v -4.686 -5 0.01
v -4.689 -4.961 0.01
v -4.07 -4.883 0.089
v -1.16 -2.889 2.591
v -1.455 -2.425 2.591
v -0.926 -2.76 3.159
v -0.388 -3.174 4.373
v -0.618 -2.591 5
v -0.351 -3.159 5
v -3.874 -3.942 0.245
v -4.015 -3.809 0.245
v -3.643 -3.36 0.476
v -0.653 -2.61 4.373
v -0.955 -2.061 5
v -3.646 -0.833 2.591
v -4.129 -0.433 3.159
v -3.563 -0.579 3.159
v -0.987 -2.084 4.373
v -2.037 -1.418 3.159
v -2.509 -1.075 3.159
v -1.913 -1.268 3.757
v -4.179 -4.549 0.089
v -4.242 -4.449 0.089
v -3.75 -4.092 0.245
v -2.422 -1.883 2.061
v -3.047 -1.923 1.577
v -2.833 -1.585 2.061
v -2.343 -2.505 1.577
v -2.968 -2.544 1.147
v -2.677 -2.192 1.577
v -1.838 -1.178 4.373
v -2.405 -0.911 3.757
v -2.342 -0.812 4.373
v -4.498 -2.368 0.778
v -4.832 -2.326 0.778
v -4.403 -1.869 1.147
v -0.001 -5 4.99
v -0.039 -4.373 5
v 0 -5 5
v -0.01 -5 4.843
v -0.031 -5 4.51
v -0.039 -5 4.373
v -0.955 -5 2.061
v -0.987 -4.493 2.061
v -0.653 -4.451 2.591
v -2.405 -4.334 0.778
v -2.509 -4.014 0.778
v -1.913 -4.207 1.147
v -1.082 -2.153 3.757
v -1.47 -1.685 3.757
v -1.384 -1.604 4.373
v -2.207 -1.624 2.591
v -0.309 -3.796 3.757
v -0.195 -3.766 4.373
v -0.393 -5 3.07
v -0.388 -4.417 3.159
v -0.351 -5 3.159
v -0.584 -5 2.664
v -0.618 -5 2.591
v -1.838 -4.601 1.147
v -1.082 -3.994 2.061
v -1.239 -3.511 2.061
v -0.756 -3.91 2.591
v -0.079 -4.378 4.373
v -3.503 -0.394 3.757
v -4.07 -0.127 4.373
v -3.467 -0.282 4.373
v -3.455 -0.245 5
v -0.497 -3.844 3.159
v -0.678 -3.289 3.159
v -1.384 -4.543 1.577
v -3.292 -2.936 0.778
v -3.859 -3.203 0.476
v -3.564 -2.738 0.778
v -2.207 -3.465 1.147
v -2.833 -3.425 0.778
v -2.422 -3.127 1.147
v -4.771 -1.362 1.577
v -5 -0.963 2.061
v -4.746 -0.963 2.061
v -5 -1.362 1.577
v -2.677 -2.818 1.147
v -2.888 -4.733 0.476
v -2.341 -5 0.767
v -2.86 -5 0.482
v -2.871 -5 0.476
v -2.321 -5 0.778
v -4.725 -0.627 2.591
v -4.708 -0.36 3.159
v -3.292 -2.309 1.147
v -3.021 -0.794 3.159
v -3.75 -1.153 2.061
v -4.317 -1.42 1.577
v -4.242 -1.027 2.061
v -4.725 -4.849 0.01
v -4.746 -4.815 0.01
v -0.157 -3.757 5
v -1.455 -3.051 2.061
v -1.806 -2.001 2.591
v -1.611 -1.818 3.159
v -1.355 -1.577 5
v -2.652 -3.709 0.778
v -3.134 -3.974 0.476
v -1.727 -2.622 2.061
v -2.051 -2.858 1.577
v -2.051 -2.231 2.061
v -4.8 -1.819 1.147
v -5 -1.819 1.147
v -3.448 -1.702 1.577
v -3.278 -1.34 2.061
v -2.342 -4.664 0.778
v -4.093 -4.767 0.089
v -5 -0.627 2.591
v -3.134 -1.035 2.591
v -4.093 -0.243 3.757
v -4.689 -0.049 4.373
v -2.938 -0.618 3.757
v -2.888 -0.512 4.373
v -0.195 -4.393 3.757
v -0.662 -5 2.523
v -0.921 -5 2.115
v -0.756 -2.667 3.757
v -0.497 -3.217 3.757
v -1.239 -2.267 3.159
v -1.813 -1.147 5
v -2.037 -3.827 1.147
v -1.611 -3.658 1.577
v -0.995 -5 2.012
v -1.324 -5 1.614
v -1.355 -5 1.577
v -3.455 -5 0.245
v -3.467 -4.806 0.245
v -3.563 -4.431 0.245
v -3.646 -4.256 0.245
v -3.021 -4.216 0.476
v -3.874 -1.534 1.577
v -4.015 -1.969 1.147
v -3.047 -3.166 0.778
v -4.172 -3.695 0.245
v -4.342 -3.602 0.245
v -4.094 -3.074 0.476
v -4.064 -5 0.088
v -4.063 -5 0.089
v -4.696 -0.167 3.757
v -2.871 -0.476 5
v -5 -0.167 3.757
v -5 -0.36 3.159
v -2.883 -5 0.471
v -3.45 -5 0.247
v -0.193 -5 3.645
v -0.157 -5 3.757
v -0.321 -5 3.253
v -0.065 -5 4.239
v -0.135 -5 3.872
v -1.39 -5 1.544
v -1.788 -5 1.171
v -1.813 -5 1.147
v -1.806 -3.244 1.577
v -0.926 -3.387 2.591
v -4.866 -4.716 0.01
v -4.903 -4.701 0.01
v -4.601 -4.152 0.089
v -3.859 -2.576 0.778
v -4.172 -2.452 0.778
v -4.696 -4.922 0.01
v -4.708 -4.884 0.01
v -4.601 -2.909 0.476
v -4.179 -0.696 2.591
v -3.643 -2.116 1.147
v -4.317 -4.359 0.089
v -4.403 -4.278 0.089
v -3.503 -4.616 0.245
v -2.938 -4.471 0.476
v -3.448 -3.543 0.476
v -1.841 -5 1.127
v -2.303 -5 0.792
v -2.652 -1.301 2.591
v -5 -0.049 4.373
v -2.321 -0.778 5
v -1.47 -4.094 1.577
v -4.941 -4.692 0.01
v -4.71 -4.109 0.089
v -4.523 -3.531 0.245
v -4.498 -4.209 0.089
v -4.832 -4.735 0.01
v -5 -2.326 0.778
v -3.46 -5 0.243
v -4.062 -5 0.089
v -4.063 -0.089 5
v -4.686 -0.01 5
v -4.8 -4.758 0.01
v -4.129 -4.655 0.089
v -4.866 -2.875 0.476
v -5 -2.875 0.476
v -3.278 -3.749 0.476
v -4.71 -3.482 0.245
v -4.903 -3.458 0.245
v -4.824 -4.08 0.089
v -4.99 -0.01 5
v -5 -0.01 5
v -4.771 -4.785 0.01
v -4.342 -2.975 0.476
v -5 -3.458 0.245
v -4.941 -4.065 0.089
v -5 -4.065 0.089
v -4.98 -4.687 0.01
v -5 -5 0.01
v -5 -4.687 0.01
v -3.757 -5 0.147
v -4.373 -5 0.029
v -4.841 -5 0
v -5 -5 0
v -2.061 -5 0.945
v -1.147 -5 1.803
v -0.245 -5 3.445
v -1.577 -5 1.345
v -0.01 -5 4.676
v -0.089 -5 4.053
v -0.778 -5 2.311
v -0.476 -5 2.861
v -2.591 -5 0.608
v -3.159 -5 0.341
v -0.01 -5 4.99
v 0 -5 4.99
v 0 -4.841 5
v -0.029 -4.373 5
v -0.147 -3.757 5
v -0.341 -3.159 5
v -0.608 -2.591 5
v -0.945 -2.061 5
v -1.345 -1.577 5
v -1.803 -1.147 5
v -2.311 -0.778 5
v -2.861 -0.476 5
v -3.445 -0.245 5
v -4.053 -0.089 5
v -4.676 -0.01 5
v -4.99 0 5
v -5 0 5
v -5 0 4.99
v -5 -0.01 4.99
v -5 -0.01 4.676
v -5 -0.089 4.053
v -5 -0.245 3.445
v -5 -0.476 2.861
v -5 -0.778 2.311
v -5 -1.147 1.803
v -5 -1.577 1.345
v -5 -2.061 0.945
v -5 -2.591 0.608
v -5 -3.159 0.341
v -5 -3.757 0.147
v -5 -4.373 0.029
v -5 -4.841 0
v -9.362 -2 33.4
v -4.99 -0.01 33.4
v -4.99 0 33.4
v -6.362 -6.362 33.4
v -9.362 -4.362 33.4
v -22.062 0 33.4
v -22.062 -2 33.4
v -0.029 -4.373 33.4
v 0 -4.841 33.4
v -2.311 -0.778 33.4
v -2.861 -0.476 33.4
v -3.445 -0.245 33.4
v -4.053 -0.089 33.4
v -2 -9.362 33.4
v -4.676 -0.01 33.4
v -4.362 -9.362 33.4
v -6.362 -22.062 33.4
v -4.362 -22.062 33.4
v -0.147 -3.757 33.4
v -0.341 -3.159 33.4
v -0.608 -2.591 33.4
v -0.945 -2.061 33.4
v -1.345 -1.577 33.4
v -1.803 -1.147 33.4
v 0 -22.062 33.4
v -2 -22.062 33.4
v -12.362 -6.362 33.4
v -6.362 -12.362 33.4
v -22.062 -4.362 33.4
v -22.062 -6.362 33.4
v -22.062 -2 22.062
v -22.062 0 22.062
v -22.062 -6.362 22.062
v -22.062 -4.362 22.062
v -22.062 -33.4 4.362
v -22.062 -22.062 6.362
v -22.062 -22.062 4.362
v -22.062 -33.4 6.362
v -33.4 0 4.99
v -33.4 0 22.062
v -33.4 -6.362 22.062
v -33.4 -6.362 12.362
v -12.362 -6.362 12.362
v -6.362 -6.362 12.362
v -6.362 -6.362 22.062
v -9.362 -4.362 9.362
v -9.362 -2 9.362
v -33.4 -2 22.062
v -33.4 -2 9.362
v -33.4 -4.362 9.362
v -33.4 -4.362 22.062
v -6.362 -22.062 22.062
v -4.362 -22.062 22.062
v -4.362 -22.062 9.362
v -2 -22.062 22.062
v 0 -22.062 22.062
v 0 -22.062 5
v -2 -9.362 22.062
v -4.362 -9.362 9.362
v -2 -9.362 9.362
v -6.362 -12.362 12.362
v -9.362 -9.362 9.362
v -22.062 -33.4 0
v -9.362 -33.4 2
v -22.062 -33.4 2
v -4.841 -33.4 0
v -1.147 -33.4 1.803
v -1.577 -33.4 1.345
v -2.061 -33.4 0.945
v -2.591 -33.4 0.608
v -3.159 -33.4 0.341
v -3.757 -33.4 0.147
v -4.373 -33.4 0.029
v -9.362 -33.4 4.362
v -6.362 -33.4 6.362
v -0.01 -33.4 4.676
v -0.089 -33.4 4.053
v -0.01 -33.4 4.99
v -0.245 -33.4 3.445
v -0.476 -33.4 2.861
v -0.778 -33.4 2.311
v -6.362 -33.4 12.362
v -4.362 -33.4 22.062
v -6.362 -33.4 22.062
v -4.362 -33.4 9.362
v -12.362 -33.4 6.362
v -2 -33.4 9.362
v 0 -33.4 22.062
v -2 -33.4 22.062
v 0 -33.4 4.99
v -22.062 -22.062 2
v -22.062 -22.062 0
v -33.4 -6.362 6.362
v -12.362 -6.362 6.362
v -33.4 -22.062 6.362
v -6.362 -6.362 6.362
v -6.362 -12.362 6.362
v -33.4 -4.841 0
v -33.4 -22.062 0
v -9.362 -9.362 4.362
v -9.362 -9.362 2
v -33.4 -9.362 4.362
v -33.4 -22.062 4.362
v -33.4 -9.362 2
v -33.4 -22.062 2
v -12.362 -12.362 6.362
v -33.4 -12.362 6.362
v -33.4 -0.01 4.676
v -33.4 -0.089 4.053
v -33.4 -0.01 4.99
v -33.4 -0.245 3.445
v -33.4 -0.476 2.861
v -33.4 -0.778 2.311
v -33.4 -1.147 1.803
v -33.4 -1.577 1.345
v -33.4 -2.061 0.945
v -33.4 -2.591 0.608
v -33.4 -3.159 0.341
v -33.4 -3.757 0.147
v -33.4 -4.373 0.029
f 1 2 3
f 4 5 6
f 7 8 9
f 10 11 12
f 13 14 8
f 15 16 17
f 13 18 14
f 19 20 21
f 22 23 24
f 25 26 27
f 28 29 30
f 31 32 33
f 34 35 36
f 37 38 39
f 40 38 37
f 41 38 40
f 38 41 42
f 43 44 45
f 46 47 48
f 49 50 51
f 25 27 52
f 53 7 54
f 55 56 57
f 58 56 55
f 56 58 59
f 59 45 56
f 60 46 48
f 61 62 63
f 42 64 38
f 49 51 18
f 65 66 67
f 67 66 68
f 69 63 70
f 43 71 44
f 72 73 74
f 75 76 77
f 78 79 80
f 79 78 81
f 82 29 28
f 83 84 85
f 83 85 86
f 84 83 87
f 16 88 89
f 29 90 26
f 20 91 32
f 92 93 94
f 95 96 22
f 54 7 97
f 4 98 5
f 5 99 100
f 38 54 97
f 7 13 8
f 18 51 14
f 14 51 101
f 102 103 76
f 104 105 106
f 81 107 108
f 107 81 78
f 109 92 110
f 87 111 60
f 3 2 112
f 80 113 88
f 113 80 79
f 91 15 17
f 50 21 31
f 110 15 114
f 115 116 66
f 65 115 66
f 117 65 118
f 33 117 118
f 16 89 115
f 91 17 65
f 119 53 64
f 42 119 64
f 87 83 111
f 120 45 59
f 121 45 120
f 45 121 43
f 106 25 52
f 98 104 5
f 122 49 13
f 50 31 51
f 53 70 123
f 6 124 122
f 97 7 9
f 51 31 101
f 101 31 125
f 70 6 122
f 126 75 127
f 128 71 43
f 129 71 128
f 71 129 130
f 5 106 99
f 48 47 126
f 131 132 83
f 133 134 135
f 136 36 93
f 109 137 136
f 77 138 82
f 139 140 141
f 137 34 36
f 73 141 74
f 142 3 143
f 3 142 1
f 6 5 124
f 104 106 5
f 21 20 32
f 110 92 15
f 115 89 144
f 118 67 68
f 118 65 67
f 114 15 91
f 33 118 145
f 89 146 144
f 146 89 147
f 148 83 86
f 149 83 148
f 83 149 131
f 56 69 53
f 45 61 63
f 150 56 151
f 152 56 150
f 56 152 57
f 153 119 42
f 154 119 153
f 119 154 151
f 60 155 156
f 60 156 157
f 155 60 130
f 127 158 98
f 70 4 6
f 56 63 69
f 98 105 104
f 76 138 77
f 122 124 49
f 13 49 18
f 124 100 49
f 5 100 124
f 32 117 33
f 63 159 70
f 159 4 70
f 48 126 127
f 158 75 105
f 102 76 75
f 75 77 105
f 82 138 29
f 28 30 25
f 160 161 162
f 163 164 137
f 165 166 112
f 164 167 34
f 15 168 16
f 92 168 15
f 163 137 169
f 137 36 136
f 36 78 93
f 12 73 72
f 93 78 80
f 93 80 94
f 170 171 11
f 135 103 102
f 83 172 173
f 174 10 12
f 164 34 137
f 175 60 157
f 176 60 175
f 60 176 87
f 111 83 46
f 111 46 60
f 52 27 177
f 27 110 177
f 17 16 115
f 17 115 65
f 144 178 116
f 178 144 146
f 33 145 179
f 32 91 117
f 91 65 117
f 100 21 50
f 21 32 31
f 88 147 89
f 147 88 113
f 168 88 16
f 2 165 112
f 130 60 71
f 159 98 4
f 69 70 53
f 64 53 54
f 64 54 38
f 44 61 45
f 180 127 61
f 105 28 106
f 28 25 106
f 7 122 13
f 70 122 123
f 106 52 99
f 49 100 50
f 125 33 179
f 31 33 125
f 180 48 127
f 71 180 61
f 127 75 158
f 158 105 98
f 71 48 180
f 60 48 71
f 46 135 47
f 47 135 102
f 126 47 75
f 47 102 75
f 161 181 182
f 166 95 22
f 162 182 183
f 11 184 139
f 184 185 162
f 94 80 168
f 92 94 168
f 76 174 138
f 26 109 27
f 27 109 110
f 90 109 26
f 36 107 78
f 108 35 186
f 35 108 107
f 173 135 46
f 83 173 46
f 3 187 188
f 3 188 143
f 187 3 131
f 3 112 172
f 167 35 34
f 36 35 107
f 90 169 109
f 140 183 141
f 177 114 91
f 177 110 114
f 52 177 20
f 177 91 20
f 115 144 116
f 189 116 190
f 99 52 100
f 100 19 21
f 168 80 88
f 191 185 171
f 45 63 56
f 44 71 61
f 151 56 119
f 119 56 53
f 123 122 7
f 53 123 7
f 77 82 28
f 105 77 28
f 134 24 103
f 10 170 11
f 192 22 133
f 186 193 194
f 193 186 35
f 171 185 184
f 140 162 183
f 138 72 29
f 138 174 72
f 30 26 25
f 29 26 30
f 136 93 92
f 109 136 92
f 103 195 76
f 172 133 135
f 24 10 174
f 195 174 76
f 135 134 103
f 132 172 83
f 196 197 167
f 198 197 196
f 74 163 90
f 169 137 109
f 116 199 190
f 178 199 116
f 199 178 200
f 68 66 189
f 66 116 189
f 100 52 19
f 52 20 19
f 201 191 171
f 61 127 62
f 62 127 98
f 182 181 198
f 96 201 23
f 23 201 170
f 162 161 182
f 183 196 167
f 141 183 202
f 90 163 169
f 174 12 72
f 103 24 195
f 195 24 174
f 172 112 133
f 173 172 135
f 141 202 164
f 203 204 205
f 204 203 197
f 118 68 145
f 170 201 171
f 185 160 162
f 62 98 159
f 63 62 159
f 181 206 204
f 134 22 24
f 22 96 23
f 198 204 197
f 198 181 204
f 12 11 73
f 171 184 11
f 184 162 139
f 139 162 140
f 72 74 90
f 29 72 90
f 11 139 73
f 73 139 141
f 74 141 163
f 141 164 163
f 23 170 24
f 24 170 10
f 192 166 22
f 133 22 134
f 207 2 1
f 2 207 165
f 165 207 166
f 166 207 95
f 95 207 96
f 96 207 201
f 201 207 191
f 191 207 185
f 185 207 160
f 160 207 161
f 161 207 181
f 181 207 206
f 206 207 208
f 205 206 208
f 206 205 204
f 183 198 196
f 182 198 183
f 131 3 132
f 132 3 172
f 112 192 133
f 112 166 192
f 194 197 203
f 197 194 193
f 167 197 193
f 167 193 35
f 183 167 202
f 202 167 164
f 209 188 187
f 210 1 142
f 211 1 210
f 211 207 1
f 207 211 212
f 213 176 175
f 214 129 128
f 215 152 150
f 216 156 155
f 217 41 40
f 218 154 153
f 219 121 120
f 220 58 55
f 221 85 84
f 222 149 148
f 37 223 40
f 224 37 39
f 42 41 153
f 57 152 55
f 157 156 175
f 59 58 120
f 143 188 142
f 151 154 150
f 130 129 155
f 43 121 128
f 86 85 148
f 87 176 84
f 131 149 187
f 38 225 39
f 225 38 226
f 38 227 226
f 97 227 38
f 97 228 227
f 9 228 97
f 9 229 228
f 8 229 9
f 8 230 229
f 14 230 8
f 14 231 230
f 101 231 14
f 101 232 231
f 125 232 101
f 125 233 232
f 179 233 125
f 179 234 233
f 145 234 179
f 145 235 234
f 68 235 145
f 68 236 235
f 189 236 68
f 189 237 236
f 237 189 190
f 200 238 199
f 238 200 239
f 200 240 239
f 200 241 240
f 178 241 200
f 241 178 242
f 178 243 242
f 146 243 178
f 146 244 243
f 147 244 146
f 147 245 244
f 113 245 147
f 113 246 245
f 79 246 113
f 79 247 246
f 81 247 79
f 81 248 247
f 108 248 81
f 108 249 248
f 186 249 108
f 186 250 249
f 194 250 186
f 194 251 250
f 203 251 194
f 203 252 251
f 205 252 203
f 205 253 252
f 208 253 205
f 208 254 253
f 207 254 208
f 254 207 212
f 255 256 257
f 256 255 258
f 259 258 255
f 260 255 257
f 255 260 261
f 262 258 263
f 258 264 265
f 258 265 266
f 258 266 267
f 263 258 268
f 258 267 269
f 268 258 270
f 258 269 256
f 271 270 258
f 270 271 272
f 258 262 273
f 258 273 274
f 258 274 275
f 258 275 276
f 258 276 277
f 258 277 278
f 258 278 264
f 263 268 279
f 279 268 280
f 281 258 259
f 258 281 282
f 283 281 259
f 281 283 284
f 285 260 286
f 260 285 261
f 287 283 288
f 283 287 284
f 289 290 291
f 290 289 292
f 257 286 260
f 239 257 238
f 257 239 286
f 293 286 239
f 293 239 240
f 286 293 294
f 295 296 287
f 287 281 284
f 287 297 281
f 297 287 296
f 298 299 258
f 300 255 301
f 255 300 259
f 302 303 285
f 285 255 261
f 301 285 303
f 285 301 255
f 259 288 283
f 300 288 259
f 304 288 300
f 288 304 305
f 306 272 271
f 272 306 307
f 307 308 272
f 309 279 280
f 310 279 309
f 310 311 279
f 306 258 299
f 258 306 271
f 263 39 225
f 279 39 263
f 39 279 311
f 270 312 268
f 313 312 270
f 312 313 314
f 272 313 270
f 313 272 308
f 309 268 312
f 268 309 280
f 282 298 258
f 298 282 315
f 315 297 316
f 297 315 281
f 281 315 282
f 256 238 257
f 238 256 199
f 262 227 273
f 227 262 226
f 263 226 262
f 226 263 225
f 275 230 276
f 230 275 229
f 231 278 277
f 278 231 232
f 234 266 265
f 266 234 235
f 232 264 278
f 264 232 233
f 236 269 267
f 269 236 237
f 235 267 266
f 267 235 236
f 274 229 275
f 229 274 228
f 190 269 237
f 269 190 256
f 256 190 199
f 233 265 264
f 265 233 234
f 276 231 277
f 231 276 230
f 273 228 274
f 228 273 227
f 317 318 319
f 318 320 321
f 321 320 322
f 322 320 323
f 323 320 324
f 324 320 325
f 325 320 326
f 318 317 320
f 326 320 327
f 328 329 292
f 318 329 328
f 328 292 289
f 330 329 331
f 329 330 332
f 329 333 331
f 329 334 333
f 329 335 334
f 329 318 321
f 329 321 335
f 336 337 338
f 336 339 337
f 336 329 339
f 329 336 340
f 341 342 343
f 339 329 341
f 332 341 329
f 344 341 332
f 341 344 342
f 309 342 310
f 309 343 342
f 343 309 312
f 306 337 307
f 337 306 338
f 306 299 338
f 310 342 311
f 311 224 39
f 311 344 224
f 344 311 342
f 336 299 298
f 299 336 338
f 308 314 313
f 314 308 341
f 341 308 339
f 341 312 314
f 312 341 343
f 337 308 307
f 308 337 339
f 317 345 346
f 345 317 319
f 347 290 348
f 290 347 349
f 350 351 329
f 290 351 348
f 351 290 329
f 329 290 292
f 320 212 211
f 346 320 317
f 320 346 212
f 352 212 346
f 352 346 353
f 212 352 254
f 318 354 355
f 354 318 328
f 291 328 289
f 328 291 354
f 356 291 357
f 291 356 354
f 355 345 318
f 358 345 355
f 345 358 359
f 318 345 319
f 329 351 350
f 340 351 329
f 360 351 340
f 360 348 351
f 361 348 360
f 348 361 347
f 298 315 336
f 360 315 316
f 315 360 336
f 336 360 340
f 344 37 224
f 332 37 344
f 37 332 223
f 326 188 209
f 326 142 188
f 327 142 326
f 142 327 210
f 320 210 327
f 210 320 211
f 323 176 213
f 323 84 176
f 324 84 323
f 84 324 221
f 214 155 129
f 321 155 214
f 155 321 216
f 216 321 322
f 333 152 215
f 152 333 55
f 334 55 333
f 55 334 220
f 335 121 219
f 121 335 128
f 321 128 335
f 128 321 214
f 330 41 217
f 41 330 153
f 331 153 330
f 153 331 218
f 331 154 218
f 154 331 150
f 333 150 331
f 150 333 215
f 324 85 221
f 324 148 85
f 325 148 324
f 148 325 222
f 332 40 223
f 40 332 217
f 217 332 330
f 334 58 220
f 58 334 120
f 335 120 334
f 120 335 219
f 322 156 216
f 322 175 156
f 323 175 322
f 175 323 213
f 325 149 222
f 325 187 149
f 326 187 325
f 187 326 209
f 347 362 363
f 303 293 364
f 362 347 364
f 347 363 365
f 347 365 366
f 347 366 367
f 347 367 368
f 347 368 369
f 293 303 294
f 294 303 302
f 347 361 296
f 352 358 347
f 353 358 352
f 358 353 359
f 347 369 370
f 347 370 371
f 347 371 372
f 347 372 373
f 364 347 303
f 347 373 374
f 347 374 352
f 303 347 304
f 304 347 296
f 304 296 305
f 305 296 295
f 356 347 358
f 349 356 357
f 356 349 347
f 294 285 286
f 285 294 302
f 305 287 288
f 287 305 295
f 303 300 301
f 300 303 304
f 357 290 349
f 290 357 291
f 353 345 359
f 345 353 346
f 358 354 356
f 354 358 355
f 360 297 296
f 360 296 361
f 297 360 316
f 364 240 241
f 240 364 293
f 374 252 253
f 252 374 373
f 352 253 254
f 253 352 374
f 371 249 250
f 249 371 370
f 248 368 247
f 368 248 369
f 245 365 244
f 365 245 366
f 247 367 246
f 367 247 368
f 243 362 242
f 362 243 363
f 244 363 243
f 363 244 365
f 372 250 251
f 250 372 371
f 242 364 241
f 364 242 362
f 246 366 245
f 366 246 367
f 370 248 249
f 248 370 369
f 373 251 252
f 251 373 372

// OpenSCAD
//translate([54.7, -78, -280.02]) import("Corner.stl");
//translate([435.9305, -329.8393, 0]) import("100_Straight.stl");

// Type of piece
piece_type = "Corner"; // [Edge, Corner]
// Depth of the slot (original=9.8, 1/2"=12.7mm)
inner_depth = 12.7;
// Width of the slot (original=4, 0.093"=2.3622mm)
inner_width = 2.3622;
// Thickness of the walls around the slot (original=1.4, preferred=2)
wall_thickness = 2;
// Height (or length) of the piece (original Edge=100, default Corner=26.5)
height = 25.4;
// Radius of the chamfered edges (original=5)
corner_radius = 5;
// Adjust higher to make inner triangular supports wider (original=1, preferred=3)
triangle_multiplier = 3;
// Adjust higher to made the corner area (between the slots) wider (original=0, preferred=3)
additional_corner = 3;

total_thickness = inner_width + 2 * wall_thickness;
total_offset = total_thickness-corner_radius;

adj_corner_radius = corner_radius > total_thickness ? total_thickness : corner_radius;

//color([1,0,0])
translate([0-(inner_depth+total_thickness+additional_corner), 0-total_thickness, 0])
if (piece_type == "Edge") {
    chamfered_edge_piece(inner_depth, inner_width, height, wall_thickness, adj_corner_radius, triangle_multiplier, additional_corner, 0);
}
else {
    chamfered_corner_piece(inner_depth, inner_width, height, wall_thickness, adj_corner_radius, triangle_multiplier, additional_corner);
}

module chamfered_corner_piece(inner_depth, inner_width, height, wall_thickness, corner_radius, triangle_multiplier, additional_corner) {
    extra = corner_radius - total_thickness < 0 ? 0 : corner_radius - total_thickness;
    triangle_cutoff = 1;
    
    translate([total_thickness+inner_depth-corner_radius+additional_corner, total_thickness-corner_radius, corner_radius])
    difference() {
        sphere(r=corner_radius, $fn=50);
        translate([-corner_radius, -corner_radius*2, -corner_radius])
        cube(size = [corner_radius*2, corner_radius*2, corner_radius*2]);
        translate([-corner_radius, -corner_radius, 0])
        cube(size = [corner_radius*2, corner_radius*2, corner_radius*2]);
        translate([-corner_radius*2, -corner_radius, -corner_radius])
        cube(size = [corner_radius*2, corner_radius*2, corner_radius*2]);
        
        translate([-corner_radius+extra, -wall_thickness, -extra])
        cube(size = [corner_radius, corner_radius, corner_radius]);
        translate([-wall_thickness, -corner_radius+extra, -extra])
        cube(size = [corner_radius, corner_radius, corner_radius]);
        translate([-corner_radius+extra, -corner_radius+extra, -corner_radius+wall_thickness])
        cube(size = [corner_radius, corner_radius, corner_radius]);
    }
    
    union() {
        translate([0, 0, corner_radius])
        chamfered_edge_piece(inner_depth, inner_width, height+additional_corner, wall_thickness, corner_radius, triangle_multiplier, additional_corner, triangle_cutoff);
        
        rotate(a=90, v=[1,0,0])
        rotate(a=-90, v=[0,0,1])
        translate([-(inner_depth+total_thickness+additional_corner), inner_depth+additional_corner, -total_thickness+corner_radius])
        chamfered_edge_piece(inner_depth, inner_width, height+additional_corner, wall_thickness, corner_radius, triangle_multiplier, additional_corner, triangle_cutoff);
        
        mirror([1, 0, 0])
        rotate(a=90, v=[0,1,0])
        translate([-(inner_depth+total_thickness+additional_corner), 0, -(inner_depth+total_thickness)+corner_radius-additional_corner])
        chamfered_edge_piece(inner_depth, inner_width, height+additional_corner, wall_thickness, corner_radius, triangle_multiplier, additional_corner, triangle_cutoff);
        
    }
}

module chamfered_edge_piece(inner_depth, inner_width, height, wall_thickness, corner_radius, triangle_multiplier, additional_corner, triangle_cutoff) {
    total_thickness = inner_width + 2 * wall_thickness;
    difference()
    {
        edge_piece(inner_depth, inner_width, height, wall_thickness, triangle_multiplier, additional_corner, triangle_cutoff);
        chamfer_edge(inner_depth, inner_width, height, wall_thickness, corner_radius, additional_corner);
    }
}

module chamfer_edge(inner_depth, inner_width, height, wall_thickness, corner_radius, additional_corner) {
    //translate([0-corner_radius+0.01, 0-corner_radius, 0])
    total_thickness = inner_width + 2 * wall_thickness;
    translate([(inner_depth+total_thickness-corner_radius+additional_corner)+0.01, total_thickness - corner_radius, 0])
    difference() {
        difference() {
            cube([corner_radius, corner_radius, height]);
            cylinder(r=corner_radius,h=height, $fn=50);
            translate([-corner_radius*2, 0, 0]) cube([corner_radius*2, corner_radius*2, height+1]);
            translate([-corner_radius, -corner_radius*2, 0]) cube([corner_radius*2, corner_radius*2, height+1]);
        }
    }

}

module triangle(triangle_height, triangle_x, triangle_y) {
    linear_extrude(height = triangle_height)
    polygon(
        [[0,0],    // Triangle side
        [triangle_x,0],
        [triangle_x,triangle_y]],
        [[0,1,2]]
    );
}

module edge_piece(inner_depth, inner_width, height, wall_thickness, triangle_multiplier, additional_corner, triangle_cutoff) {
    total_thickness = inner_width + (2 * wall_thickness);
    triangle_edge = wall_thickness*triangle_multiplier;
    overall_depth = inner_depth + total_thickness + additional_corner;
    straight(inner_depth, inner_width, height, wall_thickness, additional_corner);
    rotate(a=90, v=[0,0,1])
    translate([0-inner_depth-additional_corner, 0-overall_depth, 0]) straight(inner_depth, inner_width, height, wall_thickness, additional_corner);
    rotate(a=90, v=[0,0,1])
    translate([-triangle_edge, -(inner_depth + additional_corner), triangle_cutoff])
    triangle(height-triangle_cutoff, triangle_edge, triangle_edge);
}

module straight(inner_depth, inner_width, height, wall_thickness, additional_corner) {
    total_thickness = inner_width + (2 * wall_thickness);
    overall_depth = inner_depth + total_thickness + additional_corner;
    difference () {
        cube([overall_depth, total_thickness, height]);
        translate([-1, wall_thickness, -1])
        cube([inner_depth+1, inner_width, height+2]);
    }
}
